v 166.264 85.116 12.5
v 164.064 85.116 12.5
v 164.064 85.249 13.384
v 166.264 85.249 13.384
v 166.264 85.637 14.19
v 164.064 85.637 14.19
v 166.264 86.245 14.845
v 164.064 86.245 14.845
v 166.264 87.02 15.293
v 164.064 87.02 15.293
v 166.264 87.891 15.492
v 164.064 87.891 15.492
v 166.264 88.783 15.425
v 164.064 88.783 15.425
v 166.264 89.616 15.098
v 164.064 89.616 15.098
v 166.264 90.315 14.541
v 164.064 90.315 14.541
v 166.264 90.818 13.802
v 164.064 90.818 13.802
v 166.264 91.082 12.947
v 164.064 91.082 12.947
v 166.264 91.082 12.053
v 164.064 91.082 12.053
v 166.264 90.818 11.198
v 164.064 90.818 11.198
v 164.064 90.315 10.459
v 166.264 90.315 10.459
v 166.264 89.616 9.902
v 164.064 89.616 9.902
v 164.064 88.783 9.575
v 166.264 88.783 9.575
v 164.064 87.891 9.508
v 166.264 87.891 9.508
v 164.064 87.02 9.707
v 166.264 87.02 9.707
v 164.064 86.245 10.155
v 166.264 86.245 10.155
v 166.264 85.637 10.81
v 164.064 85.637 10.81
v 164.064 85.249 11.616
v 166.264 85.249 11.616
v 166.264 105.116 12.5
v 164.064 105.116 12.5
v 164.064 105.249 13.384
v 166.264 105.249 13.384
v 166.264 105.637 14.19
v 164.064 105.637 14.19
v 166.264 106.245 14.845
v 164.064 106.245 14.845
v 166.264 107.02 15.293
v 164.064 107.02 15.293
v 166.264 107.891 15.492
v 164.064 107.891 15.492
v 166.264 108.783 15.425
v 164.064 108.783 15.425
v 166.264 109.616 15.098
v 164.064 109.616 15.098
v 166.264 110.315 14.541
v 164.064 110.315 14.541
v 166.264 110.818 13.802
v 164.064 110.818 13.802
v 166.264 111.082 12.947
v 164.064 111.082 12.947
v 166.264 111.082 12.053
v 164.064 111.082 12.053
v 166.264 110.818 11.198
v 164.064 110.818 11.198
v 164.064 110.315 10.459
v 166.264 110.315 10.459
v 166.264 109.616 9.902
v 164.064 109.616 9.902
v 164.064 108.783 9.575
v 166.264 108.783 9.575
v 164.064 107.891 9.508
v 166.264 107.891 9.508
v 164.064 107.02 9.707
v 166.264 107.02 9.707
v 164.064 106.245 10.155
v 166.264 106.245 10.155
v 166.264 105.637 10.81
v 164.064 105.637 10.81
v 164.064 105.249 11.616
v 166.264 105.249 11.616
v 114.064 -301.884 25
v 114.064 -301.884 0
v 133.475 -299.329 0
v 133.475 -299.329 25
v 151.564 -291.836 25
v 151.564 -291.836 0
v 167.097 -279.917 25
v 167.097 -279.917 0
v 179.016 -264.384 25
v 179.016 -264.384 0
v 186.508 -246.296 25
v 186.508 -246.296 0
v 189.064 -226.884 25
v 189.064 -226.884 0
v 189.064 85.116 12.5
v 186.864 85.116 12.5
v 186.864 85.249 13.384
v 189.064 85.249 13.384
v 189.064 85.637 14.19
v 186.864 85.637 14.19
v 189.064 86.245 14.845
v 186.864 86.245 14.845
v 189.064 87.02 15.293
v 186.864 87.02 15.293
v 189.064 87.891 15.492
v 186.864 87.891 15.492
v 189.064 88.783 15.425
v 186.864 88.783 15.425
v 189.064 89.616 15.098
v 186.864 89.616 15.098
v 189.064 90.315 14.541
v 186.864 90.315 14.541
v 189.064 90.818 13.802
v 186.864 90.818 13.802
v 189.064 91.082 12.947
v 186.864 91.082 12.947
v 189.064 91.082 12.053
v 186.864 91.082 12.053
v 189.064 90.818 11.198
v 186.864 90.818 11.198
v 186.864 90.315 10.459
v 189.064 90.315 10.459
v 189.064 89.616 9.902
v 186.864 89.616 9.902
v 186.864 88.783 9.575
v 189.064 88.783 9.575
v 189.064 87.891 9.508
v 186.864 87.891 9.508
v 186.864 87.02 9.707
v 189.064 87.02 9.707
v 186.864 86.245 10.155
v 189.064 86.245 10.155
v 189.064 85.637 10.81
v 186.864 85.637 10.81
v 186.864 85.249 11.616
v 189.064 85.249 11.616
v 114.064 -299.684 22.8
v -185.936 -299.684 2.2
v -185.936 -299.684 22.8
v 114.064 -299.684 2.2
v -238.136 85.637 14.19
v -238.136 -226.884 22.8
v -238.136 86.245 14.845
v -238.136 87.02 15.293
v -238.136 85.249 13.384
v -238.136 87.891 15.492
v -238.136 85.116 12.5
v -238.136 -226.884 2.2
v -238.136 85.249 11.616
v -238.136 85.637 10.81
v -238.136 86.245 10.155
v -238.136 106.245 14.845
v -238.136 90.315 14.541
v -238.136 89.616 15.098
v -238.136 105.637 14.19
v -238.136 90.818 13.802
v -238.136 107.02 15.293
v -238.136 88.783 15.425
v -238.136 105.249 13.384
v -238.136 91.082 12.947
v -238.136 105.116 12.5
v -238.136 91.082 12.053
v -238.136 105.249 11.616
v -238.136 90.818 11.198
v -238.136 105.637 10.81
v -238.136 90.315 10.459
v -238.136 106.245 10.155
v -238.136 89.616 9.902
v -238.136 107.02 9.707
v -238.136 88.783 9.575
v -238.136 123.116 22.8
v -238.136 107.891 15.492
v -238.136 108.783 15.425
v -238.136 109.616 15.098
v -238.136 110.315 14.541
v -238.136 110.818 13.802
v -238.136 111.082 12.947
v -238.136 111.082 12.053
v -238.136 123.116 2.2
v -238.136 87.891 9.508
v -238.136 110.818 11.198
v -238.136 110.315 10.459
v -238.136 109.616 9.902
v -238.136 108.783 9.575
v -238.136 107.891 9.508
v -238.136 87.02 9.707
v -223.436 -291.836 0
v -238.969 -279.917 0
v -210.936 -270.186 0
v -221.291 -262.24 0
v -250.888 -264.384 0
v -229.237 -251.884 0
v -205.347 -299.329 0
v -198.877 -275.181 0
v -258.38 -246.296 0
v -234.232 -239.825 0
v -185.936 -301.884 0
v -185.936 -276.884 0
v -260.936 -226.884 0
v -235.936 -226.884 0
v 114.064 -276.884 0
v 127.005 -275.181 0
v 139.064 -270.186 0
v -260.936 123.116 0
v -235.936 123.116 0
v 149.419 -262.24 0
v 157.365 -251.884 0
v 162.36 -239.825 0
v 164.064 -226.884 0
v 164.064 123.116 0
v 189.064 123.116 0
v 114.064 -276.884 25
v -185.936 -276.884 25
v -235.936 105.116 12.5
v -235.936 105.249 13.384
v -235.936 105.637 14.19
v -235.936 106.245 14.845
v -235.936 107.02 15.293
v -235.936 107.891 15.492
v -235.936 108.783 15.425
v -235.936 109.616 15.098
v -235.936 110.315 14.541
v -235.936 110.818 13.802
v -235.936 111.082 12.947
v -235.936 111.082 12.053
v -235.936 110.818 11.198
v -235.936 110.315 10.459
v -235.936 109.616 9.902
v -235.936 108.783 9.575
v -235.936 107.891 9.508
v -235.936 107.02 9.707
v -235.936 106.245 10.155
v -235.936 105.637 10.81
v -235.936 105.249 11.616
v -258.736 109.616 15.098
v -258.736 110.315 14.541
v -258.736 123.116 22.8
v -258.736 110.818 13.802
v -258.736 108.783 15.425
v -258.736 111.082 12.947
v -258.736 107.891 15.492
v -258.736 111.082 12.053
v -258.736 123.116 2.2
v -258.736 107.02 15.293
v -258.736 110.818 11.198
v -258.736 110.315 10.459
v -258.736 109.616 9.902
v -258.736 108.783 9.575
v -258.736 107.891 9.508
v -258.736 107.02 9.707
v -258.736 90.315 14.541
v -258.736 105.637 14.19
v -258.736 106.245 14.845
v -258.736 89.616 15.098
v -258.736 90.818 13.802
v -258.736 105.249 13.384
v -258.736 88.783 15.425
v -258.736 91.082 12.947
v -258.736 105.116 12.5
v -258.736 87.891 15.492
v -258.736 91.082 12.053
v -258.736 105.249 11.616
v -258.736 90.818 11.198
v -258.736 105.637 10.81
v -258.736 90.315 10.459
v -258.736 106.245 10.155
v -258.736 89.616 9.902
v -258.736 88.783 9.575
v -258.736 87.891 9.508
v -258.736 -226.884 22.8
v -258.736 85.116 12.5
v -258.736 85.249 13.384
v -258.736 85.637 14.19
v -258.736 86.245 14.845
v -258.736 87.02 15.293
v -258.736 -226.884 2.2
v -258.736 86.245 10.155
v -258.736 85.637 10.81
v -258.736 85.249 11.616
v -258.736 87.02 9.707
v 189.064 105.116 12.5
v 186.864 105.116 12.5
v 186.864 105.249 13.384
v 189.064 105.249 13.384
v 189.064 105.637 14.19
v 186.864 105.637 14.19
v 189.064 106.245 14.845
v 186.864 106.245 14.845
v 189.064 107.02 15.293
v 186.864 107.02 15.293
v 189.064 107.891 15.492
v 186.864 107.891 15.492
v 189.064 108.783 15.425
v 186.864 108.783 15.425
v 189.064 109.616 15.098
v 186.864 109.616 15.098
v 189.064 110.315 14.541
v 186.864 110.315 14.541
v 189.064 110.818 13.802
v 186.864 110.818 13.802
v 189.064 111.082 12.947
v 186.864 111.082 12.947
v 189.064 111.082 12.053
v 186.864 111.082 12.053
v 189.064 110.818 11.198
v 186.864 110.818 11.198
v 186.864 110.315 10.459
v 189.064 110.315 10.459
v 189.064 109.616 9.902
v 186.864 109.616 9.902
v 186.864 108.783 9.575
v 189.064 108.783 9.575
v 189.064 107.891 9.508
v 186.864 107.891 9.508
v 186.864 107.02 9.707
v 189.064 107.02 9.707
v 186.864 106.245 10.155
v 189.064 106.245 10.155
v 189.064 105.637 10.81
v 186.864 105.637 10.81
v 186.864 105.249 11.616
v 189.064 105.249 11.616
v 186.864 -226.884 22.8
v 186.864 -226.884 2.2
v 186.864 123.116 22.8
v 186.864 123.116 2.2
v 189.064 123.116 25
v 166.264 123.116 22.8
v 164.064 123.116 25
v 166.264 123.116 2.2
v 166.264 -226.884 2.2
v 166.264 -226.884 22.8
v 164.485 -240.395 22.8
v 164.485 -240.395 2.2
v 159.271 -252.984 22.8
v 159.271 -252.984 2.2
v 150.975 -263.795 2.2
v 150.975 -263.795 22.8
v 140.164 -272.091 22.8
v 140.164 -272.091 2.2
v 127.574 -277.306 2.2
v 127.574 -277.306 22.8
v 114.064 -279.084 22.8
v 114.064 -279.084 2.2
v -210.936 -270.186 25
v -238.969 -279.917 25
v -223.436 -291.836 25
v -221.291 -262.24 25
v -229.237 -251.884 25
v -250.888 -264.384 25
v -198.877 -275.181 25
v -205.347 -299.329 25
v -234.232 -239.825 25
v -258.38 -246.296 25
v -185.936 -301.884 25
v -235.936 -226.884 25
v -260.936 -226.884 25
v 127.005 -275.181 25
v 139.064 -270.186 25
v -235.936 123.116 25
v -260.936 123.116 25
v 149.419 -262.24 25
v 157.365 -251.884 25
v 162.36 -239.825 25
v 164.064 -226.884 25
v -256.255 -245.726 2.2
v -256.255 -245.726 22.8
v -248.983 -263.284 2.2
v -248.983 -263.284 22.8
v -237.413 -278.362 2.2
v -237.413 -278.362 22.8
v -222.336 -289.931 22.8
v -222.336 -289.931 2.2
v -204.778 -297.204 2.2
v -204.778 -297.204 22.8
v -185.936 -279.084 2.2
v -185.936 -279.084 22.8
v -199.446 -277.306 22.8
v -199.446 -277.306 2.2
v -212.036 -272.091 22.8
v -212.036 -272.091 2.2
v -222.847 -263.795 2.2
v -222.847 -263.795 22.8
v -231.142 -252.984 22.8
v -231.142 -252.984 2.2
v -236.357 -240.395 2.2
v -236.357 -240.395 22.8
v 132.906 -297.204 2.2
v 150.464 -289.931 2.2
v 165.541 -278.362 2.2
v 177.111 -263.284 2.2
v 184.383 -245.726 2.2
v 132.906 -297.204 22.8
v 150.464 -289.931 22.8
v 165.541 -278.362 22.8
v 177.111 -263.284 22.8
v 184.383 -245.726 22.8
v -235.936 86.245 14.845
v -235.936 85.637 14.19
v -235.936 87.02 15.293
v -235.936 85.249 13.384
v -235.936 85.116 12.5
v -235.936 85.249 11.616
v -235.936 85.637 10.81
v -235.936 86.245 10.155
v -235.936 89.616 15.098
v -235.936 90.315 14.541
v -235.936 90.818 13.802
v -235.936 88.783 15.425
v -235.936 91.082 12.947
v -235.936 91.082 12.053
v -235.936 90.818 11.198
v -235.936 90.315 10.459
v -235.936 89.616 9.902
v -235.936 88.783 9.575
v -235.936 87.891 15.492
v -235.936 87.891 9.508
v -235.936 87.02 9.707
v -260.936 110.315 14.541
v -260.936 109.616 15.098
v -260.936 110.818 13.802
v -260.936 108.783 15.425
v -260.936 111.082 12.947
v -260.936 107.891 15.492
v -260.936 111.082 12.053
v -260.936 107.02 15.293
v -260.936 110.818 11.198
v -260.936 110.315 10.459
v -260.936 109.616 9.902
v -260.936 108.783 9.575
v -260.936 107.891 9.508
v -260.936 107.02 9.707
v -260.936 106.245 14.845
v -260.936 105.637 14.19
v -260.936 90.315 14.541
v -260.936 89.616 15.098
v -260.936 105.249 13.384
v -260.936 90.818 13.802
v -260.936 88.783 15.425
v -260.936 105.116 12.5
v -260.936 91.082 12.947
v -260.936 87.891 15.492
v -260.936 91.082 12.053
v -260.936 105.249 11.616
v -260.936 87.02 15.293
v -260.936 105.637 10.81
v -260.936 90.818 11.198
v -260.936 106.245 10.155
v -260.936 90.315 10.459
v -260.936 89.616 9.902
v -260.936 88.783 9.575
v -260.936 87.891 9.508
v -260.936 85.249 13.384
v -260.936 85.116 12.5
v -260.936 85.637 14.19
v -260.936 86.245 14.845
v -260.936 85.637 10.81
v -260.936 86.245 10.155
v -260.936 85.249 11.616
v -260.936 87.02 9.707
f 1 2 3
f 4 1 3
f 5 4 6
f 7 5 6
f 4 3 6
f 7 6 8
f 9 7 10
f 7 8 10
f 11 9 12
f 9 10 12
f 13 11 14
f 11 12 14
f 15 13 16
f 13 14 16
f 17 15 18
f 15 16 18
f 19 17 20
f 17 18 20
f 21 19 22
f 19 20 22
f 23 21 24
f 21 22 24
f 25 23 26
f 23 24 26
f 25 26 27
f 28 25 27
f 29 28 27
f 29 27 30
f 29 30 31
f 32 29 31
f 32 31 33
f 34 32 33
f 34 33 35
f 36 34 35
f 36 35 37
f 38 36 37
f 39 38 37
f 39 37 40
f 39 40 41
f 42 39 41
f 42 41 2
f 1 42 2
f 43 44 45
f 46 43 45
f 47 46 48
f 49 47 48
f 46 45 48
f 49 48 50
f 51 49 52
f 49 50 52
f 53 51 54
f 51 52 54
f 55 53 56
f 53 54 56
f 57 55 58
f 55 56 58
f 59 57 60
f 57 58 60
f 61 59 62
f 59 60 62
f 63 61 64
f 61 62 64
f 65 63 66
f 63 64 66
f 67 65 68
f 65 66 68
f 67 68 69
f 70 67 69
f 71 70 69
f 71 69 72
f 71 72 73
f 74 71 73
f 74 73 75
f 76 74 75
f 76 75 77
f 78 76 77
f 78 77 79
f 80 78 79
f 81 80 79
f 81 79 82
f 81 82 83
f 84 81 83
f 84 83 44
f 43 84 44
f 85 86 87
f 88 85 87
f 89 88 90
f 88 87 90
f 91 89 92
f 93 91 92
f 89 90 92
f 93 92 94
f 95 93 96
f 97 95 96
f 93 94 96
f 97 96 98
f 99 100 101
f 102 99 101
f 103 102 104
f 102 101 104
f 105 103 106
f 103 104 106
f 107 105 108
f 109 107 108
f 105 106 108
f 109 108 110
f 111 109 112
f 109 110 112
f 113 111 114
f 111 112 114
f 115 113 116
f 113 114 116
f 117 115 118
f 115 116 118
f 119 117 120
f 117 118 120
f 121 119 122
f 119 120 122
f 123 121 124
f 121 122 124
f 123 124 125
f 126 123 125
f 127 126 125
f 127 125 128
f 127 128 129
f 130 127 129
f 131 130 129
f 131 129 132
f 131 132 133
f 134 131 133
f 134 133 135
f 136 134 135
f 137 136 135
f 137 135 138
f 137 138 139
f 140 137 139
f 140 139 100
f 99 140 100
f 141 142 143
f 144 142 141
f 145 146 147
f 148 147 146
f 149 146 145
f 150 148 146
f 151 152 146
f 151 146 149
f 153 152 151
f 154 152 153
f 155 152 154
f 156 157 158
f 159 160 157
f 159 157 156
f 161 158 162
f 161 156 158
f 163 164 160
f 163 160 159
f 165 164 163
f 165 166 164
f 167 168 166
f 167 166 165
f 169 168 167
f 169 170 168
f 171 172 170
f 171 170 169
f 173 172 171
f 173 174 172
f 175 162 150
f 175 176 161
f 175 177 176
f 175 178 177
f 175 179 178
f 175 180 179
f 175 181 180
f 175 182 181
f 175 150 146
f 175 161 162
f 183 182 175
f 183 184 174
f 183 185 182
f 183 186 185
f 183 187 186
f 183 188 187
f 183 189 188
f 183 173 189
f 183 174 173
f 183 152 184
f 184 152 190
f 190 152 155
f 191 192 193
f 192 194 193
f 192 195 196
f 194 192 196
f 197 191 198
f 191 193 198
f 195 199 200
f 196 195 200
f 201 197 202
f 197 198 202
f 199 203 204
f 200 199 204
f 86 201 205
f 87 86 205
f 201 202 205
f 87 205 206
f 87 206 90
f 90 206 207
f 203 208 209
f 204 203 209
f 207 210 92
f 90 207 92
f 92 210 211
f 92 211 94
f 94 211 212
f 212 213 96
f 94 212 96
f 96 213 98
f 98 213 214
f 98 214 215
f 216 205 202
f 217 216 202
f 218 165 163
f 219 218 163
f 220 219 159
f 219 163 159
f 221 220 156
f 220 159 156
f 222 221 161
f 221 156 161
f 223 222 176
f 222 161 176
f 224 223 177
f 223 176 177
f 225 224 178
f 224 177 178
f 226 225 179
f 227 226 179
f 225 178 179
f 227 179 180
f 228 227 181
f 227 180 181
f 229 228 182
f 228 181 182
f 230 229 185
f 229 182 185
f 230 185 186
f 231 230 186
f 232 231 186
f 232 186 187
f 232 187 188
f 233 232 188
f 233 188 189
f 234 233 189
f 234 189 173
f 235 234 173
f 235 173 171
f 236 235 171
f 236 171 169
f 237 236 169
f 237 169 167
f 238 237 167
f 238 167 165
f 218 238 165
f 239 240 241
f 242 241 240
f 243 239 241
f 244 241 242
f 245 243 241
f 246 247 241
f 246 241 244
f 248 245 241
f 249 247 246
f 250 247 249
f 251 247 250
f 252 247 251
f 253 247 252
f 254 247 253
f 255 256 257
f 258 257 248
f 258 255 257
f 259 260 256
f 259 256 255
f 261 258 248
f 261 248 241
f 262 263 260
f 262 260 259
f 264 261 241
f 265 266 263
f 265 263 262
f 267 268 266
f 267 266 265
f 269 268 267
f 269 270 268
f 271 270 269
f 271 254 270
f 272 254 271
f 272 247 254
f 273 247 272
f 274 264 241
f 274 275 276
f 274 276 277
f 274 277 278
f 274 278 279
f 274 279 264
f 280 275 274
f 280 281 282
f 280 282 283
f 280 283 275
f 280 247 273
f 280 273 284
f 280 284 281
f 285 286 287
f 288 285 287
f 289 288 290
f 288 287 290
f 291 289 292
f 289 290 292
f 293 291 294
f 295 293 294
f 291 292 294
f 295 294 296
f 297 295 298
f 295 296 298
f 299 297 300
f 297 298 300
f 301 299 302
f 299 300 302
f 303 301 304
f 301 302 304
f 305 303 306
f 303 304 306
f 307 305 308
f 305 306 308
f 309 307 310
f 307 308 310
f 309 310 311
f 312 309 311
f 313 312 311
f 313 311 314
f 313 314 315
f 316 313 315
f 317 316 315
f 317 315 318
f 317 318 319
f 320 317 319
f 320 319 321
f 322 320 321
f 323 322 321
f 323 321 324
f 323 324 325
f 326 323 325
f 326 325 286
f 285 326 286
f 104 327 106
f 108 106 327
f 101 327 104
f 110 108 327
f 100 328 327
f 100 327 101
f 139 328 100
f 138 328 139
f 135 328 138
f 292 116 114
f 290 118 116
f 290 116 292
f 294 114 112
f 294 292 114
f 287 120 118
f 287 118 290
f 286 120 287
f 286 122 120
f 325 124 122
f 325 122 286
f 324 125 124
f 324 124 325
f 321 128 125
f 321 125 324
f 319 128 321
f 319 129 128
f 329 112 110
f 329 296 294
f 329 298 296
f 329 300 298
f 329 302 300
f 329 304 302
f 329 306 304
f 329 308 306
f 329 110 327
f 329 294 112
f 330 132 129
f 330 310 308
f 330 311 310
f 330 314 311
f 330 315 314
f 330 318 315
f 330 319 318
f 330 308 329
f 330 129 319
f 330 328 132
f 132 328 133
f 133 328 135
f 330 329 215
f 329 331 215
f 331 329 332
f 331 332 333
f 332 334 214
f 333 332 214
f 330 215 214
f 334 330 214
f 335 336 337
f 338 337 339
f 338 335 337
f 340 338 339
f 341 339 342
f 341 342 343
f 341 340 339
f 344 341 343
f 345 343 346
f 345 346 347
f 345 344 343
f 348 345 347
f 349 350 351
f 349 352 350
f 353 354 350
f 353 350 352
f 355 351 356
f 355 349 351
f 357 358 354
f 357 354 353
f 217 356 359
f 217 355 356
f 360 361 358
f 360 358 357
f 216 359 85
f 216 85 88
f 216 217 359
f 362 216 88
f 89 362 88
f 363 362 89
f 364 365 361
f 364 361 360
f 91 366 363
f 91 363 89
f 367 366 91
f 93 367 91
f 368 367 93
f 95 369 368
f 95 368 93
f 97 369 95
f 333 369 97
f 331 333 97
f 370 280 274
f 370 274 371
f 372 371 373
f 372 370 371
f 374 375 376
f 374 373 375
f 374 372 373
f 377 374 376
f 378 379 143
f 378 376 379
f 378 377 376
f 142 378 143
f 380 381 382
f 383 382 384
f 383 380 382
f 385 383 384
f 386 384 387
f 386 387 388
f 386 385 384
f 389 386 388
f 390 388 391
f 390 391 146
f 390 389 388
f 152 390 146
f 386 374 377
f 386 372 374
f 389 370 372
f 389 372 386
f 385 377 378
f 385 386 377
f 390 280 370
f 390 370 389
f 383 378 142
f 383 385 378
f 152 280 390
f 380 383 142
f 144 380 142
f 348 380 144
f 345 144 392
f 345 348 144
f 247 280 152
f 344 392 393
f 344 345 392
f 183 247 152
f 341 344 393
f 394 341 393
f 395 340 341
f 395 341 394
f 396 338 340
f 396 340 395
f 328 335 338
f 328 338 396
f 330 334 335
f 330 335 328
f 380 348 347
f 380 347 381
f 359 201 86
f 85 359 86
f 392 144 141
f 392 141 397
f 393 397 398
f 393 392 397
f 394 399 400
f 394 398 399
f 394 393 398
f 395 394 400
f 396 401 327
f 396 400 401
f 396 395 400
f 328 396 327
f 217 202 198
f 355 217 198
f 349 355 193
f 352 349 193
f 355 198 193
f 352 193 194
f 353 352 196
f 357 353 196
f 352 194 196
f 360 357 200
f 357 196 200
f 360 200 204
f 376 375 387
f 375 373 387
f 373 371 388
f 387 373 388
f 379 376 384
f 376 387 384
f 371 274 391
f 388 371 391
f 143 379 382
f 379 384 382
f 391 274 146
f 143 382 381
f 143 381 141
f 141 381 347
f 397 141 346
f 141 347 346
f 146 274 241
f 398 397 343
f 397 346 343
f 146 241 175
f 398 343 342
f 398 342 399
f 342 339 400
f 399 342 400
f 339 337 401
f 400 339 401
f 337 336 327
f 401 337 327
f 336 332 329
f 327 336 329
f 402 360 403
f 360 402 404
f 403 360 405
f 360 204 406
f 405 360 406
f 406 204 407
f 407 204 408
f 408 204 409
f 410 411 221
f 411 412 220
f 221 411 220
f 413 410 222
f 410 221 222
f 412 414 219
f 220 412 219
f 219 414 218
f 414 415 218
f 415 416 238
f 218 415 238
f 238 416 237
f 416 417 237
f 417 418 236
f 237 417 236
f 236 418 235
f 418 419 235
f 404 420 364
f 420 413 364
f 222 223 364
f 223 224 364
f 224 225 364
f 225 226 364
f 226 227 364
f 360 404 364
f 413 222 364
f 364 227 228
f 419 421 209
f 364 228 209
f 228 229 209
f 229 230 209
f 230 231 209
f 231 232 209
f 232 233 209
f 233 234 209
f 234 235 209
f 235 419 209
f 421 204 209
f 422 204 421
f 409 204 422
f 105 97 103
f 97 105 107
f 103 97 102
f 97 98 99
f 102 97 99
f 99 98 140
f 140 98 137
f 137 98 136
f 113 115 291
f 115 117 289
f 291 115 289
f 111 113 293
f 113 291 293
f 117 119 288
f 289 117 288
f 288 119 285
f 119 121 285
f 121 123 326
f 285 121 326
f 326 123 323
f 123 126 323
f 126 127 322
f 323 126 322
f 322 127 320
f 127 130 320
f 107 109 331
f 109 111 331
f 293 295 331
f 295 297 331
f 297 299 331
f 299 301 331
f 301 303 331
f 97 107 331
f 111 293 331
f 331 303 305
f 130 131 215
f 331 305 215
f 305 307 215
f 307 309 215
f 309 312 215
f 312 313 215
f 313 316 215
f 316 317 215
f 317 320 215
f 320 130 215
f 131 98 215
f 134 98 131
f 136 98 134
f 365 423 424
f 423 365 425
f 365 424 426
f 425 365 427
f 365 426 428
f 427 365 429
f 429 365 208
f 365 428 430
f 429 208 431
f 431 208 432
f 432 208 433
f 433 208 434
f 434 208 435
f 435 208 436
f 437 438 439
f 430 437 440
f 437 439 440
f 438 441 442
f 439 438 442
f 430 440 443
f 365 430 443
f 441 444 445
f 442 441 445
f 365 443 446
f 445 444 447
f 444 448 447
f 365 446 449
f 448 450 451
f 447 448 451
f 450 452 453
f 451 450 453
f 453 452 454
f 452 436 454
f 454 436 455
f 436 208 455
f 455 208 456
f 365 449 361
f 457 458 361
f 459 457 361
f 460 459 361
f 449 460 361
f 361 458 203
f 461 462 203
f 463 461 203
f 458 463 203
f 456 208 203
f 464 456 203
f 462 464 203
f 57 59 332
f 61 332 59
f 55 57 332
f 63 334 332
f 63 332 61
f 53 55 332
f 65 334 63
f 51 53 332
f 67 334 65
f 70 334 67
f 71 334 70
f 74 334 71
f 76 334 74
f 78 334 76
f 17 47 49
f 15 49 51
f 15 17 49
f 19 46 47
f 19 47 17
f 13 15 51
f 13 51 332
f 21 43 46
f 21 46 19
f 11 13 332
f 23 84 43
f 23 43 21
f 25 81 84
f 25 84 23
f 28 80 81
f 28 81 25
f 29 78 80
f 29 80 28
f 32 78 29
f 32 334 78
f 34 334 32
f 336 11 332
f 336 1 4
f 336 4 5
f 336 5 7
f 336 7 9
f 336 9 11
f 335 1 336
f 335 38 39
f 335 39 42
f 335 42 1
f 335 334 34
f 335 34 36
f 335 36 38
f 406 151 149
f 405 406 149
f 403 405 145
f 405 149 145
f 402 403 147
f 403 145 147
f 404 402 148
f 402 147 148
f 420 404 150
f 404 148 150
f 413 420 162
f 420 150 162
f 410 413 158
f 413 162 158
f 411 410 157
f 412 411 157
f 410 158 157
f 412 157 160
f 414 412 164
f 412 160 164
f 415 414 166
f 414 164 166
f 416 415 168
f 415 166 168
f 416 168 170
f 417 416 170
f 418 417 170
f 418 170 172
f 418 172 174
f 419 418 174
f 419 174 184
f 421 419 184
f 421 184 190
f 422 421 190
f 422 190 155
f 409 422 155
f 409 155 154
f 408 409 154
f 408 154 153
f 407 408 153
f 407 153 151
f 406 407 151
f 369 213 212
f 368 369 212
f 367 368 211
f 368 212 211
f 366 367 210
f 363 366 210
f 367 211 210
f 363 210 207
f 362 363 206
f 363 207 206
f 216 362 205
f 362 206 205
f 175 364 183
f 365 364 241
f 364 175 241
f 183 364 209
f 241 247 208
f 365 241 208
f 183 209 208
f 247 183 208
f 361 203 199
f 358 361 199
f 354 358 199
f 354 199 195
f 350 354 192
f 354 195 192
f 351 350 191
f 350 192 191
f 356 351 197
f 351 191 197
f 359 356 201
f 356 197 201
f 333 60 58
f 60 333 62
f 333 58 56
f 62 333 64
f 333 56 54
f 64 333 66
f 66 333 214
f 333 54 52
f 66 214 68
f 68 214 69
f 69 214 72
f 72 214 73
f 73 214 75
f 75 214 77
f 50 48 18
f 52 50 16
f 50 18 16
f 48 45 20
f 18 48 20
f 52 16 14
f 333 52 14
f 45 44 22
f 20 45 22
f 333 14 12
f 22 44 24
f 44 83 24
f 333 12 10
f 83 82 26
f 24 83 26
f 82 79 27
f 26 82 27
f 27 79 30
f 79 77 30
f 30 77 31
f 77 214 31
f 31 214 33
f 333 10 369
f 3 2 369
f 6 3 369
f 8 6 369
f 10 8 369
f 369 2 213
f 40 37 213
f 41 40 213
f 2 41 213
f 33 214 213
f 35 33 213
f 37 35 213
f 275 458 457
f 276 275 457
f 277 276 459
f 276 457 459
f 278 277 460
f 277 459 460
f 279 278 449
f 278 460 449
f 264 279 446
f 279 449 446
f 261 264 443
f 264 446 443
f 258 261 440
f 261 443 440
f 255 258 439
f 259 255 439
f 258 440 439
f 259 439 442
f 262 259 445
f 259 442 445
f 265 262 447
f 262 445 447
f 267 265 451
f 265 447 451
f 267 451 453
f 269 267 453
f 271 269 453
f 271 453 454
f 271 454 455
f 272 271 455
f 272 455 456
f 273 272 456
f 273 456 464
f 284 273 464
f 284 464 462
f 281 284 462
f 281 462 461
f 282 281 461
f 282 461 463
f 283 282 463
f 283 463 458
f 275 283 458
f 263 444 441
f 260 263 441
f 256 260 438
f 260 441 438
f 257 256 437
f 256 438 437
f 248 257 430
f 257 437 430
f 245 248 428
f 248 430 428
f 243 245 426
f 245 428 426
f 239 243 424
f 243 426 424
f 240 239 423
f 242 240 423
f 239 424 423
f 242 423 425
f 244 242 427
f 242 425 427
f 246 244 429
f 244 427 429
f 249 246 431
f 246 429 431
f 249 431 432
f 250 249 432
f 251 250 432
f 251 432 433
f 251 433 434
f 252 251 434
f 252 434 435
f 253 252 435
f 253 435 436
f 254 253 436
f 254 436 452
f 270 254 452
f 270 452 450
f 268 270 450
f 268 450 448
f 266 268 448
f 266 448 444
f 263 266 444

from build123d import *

# Parameters (mm, degrees)
EXTRUDE_1_DEPTH     = 25
SHELL_1_T           = -2.2
SKETCH_2_W          = 20.6
SKETCH_2_H          = 20.6
CUT_EXTRUDE_1_DEPTH = 5
SKETCH_3_R          = 3
CUT_EXTRUDE_2_DEPTH = 451


with BuildPart() as part:
    # Эскиз1 → Бобышка-Вытянуть1 (new body)
    with BuildSketch(Plane.XY):
        with BuildLine():
            Line((-260.93597277, 123.115577889), (-260.93597277, -226.884422111))
            ThreePointArc((-260.93597277, -226.884422111), (-238.968981359, -279.9174307), (-185.93597277, -301.884422111))
            Line((-185.93597277, -301.884422111), (114.06402723, -301.884422111))
            ThreePointArc((114.06402723, -301.884422111), (167.097035819, -279.9174307), (189.06402723, -226.884422111))
            Line((189.06402723, -226.884422111), (189.06402723, 123.115577889))
            Line((189.06402723, 123.115577889), (164.06402723, 123.115577889))
            Line((164.06402723, 123.115577889), (164.06402723, -226.884422111))
            ThreePointArc((164.06402723, -226.884422111), (149.419366289, -262.23976117), (114.06402723, -276.884422111))
            Line((114.06402723, -276.884422111), (-185.93597277, -276.884422111))
            ThreePointArc((-185.93597277, -276.884422111), (-221.291311829, -262.23976117), (-235.93597277, -226.884422111))
            Line((-235.93597277, -226.884422111), (-235.93597277, 123.115577889))
            Line((-235.93597277, 123.115577889), (-260.93597277, 123.115577889))
        make_face()
    extrude(amount=EXTRUDE_1_DEPTH)

    # Оболочка1
    shell_1_openings = [part.faces().sort_by_distance(p)[0] for p in [
        (-248.43597277, 123.115577889, 12.5),
    ]]
    offset(amount=SHELL_1_T, openings=shell_1_openings, kind=Kind.INTERSECTION)

    # Эскиз2 → Вырез-Вытянуть1 (cut)
    with BuildSketch(Plane(origin=(0, 123.115577889, 0), x_dir=(1, 0, 0), z_dir=(0, 1, 0))):
        with Locations((176.56402723, -12.5)):
            Rectangle(SKETCH_2_W, SKETCH_2_H)
    extrude(amount=-CUT_EXTRUDE_1_DEPTH, mode=Mode.SUBTRACT)

    # Эскиз3 → Вырез-Вытянуть2 (cut, through all)
    with BuildSketch(Plane.ZY.offset(260.93597277)):
        with Locations(Location((12.5, 108.115577889, 0), (0, 0, 270))):  # turned: the seam where the file's is
            Circle(SKETCH_3_R)
        with Locations(Location((12.5, 88.115577889, 0), (0, 0, 270))):  # turned: the seam where the file's is
            Circle(SKETCH_3_R)
    extrude(amount=-CUT_EXTRUDE_2_DEPTH, mode=Mode.SUBTRACT)


solid = part.part
